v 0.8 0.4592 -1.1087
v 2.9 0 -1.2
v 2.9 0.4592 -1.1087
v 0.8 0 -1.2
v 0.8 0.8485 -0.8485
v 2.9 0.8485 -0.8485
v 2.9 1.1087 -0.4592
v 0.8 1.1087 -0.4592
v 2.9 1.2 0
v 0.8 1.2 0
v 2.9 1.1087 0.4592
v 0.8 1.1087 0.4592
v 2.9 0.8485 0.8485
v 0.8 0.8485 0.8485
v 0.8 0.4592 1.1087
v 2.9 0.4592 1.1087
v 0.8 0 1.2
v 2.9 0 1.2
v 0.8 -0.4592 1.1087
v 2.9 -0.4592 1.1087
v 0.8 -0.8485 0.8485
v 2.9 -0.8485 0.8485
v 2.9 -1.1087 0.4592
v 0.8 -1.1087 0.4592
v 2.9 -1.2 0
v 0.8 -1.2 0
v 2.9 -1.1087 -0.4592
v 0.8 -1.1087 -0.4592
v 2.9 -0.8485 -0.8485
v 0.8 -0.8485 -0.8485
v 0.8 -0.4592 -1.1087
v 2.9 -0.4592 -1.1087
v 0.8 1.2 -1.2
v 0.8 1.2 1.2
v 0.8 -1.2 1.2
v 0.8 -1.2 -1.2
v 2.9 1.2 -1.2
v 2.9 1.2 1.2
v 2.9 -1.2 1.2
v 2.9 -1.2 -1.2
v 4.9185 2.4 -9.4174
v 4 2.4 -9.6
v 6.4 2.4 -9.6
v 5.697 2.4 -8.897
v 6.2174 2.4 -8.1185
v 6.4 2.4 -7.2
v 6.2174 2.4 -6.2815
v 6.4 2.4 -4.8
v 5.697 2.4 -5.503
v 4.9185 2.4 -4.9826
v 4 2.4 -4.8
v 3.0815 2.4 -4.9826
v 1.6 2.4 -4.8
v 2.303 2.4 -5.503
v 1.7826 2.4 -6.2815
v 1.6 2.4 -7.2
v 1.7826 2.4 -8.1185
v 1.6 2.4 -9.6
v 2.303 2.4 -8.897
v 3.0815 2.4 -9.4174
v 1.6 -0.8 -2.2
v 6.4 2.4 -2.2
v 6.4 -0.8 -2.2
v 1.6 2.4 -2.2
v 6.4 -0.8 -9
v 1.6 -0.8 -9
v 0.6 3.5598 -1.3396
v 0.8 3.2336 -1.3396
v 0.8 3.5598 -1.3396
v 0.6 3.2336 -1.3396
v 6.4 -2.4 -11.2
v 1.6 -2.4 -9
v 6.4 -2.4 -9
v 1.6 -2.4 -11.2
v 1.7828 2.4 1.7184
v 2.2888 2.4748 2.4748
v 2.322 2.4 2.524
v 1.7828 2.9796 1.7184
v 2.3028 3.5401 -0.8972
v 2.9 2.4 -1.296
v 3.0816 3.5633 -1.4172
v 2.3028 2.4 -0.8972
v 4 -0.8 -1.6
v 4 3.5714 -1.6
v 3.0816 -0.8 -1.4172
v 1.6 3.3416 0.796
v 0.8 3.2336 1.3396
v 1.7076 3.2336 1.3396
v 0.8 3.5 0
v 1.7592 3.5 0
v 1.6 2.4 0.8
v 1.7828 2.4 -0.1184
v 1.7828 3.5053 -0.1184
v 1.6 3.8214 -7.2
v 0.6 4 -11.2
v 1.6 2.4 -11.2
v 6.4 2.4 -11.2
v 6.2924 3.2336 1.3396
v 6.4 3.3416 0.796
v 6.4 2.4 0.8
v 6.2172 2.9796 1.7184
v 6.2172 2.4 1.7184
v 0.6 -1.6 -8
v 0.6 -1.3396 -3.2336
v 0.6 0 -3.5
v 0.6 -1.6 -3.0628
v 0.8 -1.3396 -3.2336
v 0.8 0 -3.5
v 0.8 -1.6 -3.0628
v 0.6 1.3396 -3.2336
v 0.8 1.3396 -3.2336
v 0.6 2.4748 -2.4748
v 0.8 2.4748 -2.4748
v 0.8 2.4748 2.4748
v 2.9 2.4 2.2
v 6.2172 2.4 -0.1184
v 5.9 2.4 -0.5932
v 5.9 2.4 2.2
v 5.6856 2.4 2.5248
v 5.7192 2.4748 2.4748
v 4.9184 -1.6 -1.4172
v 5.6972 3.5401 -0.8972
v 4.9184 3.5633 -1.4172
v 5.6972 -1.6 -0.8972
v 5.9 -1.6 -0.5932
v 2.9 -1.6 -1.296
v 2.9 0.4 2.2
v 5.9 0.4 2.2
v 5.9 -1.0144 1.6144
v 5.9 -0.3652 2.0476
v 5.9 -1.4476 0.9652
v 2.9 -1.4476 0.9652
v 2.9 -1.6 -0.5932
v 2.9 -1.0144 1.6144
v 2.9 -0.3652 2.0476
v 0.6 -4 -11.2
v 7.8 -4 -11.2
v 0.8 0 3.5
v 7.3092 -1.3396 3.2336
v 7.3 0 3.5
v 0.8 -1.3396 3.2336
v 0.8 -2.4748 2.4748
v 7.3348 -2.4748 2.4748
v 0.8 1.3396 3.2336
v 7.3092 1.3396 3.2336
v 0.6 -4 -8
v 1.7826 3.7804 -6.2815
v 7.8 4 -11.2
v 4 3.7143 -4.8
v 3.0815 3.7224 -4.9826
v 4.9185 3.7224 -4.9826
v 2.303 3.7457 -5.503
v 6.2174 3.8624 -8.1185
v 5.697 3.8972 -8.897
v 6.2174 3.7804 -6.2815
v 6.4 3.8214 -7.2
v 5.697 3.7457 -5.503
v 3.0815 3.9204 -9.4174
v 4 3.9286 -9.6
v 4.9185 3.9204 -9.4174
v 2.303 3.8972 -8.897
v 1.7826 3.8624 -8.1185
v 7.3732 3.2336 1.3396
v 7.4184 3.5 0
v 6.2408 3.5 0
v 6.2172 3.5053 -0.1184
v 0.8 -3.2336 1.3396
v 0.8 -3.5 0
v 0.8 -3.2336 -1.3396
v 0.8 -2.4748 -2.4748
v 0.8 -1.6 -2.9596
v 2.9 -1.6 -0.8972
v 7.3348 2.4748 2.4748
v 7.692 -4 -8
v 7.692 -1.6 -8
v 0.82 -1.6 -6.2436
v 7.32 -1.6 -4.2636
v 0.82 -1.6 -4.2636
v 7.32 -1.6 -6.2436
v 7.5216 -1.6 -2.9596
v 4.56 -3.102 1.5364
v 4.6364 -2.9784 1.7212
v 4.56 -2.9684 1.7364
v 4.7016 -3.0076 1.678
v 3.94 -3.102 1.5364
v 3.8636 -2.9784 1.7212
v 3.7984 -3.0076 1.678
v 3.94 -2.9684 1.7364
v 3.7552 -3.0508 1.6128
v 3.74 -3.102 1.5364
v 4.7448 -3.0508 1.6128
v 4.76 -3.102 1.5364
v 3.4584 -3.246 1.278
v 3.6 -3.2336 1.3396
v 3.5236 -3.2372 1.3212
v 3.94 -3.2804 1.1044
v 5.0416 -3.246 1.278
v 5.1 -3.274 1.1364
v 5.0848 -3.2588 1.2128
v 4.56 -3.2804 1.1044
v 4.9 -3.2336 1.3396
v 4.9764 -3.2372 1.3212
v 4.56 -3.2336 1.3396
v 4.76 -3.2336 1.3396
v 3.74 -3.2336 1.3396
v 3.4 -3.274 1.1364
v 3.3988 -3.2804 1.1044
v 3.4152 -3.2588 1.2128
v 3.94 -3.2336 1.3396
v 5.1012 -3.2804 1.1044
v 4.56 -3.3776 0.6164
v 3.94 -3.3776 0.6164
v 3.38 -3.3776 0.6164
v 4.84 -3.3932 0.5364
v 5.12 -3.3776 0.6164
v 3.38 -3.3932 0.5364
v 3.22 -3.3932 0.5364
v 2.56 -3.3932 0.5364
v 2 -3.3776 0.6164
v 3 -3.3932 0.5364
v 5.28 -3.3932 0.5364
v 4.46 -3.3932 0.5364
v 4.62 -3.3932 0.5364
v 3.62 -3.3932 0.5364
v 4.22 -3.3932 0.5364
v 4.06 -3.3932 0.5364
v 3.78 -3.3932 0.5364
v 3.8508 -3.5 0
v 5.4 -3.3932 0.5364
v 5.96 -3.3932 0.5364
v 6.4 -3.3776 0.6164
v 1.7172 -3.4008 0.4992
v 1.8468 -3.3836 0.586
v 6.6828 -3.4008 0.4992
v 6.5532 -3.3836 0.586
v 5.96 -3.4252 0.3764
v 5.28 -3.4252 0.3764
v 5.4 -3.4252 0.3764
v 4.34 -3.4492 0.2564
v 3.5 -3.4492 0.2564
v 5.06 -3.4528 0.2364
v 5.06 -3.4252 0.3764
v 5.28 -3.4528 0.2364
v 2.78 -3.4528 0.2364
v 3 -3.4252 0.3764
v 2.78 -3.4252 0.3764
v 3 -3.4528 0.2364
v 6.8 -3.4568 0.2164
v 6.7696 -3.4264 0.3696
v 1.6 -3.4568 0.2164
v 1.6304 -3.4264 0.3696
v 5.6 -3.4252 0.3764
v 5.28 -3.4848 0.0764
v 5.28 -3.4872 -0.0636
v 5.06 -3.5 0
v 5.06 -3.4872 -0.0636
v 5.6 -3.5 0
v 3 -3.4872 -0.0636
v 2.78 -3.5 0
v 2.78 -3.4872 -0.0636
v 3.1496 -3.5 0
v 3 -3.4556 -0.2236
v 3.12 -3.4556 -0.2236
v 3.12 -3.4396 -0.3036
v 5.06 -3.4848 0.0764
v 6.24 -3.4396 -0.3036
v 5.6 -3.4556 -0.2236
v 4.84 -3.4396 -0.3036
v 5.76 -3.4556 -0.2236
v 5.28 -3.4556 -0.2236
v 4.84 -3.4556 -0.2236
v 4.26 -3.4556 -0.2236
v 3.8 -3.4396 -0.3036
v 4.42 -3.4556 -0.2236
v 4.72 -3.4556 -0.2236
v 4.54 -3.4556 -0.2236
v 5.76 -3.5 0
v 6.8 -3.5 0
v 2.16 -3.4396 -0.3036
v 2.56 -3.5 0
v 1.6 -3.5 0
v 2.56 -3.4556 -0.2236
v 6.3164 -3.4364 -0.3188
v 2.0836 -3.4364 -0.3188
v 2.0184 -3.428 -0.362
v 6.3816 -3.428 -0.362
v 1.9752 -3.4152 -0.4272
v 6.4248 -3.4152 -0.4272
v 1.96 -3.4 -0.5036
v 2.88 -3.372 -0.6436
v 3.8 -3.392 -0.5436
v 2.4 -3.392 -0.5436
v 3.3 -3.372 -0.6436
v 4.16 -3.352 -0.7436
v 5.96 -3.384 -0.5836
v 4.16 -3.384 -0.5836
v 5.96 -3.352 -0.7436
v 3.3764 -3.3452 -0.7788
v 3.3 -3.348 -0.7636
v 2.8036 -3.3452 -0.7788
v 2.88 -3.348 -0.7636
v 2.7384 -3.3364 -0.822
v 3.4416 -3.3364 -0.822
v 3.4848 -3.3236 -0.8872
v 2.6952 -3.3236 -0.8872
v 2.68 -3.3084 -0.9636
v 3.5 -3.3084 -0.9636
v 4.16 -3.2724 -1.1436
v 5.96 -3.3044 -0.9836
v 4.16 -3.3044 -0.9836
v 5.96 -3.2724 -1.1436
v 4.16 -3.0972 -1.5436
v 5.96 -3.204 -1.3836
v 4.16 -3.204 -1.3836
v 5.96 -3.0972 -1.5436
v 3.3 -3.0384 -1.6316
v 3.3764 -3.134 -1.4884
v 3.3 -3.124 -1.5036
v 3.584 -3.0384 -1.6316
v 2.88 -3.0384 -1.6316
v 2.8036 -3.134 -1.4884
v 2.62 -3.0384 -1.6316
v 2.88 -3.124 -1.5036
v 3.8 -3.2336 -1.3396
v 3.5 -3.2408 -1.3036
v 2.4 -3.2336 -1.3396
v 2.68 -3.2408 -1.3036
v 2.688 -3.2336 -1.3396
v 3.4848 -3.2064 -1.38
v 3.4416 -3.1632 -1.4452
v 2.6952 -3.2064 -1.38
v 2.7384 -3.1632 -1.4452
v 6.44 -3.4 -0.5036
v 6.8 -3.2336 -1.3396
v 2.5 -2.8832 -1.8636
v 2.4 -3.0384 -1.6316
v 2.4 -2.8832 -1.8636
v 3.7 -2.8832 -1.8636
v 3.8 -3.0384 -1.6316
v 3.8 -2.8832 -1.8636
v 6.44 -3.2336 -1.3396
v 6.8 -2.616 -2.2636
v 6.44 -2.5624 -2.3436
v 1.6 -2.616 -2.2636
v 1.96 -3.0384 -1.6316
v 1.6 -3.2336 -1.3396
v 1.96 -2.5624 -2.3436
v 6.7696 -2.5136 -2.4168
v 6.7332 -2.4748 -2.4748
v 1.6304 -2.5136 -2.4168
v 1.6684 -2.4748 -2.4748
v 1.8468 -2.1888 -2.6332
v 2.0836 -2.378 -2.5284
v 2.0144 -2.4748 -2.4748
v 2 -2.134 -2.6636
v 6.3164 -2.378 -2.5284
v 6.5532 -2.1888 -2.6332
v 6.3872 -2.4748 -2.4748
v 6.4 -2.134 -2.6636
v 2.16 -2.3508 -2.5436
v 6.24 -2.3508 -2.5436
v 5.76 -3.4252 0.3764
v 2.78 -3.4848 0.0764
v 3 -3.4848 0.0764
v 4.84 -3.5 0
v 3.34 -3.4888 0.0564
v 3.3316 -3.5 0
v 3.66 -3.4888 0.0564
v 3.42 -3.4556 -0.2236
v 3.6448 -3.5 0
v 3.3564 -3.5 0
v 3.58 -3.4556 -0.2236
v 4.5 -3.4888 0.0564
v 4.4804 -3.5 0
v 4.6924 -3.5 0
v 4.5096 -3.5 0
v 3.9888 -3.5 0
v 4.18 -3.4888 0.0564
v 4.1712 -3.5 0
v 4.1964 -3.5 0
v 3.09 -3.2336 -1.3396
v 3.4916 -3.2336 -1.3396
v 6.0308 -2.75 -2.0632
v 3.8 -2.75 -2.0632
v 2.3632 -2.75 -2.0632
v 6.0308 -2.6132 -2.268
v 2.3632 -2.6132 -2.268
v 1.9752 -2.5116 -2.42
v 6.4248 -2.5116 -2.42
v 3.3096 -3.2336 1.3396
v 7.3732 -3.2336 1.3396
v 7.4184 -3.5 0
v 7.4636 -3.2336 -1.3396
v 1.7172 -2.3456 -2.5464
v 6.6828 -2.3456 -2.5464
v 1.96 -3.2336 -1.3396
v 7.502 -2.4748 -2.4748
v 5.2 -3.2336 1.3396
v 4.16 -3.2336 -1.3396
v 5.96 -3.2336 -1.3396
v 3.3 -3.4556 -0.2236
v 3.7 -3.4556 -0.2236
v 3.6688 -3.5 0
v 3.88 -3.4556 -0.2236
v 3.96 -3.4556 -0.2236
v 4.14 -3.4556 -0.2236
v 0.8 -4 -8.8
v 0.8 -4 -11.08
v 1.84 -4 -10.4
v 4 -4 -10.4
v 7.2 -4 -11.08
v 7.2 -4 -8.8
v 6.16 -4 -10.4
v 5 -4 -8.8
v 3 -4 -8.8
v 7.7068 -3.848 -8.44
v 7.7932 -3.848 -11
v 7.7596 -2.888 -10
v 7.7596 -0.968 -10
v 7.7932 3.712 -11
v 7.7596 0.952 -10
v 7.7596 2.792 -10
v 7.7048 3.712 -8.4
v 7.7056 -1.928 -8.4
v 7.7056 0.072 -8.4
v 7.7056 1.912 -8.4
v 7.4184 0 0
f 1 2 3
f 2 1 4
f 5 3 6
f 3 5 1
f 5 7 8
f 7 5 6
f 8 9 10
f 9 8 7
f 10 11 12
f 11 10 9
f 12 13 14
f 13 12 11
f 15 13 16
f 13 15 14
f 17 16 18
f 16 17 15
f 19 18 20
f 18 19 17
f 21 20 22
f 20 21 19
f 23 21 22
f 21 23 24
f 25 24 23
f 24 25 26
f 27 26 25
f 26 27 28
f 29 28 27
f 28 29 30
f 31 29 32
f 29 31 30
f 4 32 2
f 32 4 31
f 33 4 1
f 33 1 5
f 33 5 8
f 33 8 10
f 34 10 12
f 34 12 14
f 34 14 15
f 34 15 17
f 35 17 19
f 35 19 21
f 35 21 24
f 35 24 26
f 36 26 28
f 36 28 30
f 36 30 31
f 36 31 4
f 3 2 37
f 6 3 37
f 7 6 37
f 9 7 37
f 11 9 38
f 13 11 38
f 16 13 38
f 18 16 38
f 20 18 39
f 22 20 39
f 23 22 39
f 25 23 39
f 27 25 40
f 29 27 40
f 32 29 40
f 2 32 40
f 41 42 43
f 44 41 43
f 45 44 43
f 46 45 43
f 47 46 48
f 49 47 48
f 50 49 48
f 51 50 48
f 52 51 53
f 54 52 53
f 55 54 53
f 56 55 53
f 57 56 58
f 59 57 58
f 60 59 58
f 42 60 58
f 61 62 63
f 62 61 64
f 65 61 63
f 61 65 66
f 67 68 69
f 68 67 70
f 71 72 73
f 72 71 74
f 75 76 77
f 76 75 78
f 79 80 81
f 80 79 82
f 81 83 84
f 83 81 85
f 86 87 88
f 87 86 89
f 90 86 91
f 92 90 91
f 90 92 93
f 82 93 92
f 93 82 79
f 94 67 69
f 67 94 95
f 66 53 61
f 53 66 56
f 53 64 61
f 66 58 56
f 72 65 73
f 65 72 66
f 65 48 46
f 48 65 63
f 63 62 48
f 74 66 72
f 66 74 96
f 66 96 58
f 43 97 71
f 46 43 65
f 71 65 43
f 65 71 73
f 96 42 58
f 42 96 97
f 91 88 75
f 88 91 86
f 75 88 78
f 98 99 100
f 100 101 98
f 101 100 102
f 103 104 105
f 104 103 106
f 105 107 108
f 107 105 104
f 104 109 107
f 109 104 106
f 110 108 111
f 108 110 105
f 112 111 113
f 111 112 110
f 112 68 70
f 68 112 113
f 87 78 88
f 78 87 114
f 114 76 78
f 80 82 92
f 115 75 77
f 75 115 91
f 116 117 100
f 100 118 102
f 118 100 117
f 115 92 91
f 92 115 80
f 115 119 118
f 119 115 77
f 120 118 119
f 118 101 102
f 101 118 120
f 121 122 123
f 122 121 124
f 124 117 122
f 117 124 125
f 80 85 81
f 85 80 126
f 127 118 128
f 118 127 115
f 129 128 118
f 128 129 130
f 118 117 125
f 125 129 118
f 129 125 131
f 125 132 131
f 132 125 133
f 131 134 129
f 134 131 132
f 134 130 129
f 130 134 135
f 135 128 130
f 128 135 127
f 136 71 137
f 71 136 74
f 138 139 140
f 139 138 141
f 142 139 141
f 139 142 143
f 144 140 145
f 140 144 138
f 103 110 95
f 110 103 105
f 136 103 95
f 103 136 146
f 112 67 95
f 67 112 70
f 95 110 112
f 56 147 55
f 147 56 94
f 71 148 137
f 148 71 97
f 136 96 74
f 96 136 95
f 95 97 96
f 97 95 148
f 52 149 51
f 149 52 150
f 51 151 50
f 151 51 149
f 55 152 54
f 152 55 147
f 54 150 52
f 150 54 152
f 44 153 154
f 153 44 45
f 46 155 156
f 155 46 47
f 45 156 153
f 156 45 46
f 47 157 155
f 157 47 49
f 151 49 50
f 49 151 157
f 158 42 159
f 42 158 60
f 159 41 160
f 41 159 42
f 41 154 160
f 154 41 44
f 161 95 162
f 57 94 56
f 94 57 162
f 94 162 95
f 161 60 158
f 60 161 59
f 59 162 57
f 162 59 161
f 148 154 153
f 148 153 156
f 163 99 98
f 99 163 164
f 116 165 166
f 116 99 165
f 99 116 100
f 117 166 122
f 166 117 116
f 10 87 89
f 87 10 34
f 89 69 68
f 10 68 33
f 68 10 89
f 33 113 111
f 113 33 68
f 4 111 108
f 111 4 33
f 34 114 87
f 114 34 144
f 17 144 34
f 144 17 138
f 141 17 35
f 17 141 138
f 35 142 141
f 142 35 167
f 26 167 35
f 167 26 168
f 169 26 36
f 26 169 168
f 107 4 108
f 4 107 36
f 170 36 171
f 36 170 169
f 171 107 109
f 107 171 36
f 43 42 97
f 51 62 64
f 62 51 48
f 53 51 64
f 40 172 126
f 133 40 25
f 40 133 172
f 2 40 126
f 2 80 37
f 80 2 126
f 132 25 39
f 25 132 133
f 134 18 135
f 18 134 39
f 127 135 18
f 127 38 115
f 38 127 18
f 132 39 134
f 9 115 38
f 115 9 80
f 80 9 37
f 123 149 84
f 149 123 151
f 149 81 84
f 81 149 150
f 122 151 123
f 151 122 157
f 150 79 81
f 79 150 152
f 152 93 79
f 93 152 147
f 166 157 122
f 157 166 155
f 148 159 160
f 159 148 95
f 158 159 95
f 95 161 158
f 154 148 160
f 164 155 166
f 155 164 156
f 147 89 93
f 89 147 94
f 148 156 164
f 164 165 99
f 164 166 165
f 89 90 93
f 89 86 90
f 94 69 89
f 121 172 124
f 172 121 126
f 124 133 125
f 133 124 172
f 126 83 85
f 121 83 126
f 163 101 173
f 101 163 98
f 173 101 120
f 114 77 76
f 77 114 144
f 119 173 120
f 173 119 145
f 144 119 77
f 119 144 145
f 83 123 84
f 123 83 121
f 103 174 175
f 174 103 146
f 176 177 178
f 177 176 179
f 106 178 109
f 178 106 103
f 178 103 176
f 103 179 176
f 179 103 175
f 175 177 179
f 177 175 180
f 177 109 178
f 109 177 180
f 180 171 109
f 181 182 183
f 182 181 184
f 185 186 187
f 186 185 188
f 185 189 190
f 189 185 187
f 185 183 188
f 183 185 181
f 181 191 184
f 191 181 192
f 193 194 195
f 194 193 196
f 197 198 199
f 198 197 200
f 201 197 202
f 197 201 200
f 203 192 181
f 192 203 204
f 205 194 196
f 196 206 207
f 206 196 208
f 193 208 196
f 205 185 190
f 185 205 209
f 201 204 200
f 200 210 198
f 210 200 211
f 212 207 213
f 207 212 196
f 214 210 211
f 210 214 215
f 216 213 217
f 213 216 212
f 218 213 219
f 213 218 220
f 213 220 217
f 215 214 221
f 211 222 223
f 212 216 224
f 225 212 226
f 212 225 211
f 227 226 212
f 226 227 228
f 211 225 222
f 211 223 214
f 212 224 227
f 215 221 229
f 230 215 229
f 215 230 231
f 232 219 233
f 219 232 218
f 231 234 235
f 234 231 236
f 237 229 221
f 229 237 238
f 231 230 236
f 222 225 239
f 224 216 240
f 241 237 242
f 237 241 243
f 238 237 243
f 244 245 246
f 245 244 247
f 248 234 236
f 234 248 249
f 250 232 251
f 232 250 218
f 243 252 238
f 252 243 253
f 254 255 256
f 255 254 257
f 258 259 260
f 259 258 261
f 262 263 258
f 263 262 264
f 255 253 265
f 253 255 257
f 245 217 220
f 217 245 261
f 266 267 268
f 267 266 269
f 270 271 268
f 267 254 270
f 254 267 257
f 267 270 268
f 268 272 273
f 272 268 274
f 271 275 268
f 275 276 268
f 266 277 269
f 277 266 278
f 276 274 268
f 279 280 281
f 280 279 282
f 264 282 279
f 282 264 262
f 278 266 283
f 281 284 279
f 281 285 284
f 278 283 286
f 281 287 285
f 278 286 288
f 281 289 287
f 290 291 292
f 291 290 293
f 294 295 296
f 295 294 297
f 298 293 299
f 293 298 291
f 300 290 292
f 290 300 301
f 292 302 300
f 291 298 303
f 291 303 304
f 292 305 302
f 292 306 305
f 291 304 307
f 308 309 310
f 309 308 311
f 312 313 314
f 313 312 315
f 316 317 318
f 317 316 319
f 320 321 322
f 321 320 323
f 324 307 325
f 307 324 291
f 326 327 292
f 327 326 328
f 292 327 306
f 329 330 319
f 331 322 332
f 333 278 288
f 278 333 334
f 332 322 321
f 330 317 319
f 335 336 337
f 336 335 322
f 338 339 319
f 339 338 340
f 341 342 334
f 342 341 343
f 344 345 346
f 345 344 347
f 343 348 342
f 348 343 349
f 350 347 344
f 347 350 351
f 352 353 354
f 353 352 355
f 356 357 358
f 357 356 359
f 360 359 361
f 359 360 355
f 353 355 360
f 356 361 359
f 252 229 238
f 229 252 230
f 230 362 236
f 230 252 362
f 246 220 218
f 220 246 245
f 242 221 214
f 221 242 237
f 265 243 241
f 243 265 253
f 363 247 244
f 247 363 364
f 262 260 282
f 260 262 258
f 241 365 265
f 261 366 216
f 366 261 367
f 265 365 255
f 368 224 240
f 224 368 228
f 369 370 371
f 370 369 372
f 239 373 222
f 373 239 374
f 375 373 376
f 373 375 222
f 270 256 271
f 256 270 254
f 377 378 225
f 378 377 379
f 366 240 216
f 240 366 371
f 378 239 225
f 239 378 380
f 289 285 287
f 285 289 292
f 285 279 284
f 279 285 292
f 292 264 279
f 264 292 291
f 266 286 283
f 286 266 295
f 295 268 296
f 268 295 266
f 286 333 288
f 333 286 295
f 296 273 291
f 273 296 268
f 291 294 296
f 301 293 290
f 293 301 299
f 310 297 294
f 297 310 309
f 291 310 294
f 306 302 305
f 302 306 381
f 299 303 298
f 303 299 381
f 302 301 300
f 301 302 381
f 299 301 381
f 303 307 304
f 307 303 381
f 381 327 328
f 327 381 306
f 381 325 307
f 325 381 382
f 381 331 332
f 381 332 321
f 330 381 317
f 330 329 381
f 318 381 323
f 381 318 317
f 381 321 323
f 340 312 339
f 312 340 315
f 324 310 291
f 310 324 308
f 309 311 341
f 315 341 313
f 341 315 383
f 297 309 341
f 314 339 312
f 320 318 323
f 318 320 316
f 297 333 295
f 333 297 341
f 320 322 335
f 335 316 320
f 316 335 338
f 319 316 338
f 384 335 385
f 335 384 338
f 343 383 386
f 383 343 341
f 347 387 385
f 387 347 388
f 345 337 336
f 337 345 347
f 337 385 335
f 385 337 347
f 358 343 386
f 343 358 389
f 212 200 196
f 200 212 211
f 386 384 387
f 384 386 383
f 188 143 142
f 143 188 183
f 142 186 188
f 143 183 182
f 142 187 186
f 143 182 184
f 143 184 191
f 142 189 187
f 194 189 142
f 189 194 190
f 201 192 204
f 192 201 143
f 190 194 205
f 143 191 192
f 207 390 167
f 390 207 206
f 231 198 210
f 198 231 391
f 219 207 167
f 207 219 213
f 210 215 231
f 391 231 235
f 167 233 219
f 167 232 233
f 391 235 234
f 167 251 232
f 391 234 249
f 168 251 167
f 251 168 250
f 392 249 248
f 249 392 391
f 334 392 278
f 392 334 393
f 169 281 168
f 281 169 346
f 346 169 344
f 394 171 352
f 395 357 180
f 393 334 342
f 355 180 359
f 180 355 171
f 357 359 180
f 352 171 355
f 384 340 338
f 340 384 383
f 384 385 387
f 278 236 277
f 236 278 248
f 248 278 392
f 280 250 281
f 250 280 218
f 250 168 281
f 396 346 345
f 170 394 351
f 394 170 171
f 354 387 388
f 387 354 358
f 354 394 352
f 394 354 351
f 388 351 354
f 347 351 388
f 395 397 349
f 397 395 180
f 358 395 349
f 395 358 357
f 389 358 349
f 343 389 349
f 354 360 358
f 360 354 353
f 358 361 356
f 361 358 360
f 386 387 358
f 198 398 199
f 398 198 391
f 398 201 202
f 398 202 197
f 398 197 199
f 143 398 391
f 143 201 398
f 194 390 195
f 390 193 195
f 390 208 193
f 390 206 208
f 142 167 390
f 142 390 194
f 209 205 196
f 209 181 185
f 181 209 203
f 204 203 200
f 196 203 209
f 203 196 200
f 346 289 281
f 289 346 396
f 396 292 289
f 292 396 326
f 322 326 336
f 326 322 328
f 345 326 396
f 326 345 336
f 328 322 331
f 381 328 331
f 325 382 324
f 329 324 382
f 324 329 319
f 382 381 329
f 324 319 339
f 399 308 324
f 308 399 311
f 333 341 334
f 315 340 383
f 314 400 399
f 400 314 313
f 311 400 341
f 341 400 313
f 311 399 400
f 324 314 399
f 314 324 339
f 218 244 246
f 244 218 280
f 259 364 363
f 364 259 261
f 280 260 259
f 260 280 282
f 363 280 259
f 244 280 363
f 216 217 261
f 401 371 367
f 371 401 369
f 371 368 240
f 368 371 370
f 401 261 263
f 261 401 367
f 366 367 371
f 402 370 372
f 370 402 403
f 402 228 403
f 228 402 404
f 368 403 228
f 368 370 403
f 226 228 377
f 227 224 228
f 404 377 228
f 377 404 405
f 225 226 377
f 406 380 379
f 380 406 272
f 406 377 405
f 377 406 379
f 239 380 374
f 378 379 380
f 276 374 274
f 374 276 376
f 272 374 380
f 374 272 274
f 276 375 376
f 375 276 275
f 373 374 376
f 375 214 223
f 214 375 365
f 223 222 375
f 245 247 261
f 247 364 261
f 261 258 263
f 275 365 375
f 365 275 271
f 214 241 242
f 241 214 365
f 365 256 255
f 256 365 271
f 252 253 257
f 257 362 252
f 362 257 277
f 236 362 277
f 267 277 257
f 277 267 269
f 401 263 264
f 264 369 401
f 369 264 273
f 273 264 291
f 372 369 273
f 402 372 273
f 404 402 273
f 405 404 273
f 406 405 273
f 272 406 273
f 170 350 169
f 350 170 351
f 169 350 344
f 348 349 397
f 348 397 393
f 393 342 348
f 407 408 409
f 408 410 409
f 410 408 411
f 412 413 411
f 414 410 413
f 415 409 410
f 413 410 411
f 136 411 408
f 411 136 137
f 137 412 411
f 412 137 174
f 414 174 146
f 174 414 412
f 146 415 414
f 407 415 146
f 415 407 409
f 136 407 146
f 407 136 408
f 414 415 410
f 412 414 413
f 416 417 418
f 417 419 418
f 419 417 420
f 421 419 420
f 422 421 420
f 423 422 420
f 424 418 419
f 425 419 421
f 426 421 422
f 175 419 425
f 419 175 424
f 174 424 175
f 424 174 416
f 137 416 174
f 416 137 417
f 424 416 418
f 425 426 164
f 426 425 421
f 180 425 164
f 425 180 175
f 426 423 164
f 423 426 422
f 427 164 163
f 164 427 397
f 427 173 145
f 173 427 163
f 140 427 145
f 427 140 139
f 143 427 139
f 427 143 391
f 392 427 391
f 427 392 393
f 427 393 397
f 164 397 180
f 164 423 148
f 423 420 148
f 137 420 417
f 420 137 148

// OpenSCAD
use <../lib.scad>
use <s/3817bp8is01.scad>
use <s/3817bp8is02.scad>
use <s/3817bs02.scad>
function ldraw_lib__3817bp8i() = [
// 0 ~Minifig Leg Left with 'EMMET' Badge, Reflective Stripe and Silver Triangles on Foot Pattern (Obsolete)
// 0 Name: 3817bp8i.dat
// 0 Author: Chris Dee [cwdee]
// 0 !LDRAW_ORG Part UPDATE 2023-03
// 0 !LICENSE Licensed under CC BY 4.0 : see CAreadme.txt
// 
// 0 BFC CERTIFY CCW
  [0,"BFC","CERTIFY"],
  [0,"BFC","CCW"],
// 
// 0 !CATEGORY Obsolete
// 0 !KEYWORDS Emmet, Set 70816
// 
// 0 !CMDLINE -c25
// 
// 0 !HISTORY 2015-10-27 [Christophe_Mitillo] Original pattern design
// 0 !HISTORY 2020-06-13 [cwdee] Adapted to corrected geometry
// 0 !HISTORY 2020-12-29 [PTadmin] Official Update 2020-03
// 0 !HISTORY 2023-05-22 [Holly-Wood] Obsoleted due to bad geometry
// 0 !HISTORY 2023-06-24 [OrionP] Official Update 2023-03
// 
// 
// 1 16 0 0 0 1 0 0 0 1 0 0 0 1 s\3817bs02.dat
  [1,16,0,0,0,1,0,0,0,1,0,0,0,1, ldraw_lib__s__3817bs02()],
// 0 // Foot Top
// 4 16 1.5 20 -4 1.5 20 -10 19.23 20 -10 19.23 20 -4
  [4,16,1.5,20,-4,1.5,20,-10,19.23,20,-10,19.23,20,-4],
// 0 // Curve and front pattern
// 1 16 0 0 0 1 0 0 0 1 0 0 0 1 s\3817bp8is01.dat
  [1,16,0,0,0,1,0,0,0,1,0,0,0,1, ldraw_lib__s__3817bp8is01()],
// 5 24 2 3.349 -8.084 18.659 3.349 -8.084 2 0 -8.75 2 6.187 -6.187
  [5,24,2,3.349,-8.084,18.659,3.349,-8.084,2,0,-8.75,2,6.187,-6.187],
// 5 24 2 6.187 -6.187 18.755 6.187 -6.187 2 7.399 -4 2 3.349 -8.084
  [5,24,2,6.187,-6.187,18.755,6.187,-6.187,2,7.399,-4,2,3.349,-8.084],
// 5 24 2 0 -8.75 18.546 0 -8.75 2 3.349 -8.084 2 -3.349 -8.084
  [5,24,2,0,-8.75,18.546,0,-8.75,2,3.349,-8.084,2,-3.349,-8.084],
// 5 24 2 -3.349 -8.084 18.433 -3.349 -8.084 2 0 -8.75 2 -6.187 -6.187
  [5,24,2,-3.349,-8.084,18.433,-3.349,-8.084,2,0,-8.75,2,-6.187,-6.187],
// 0 // Side and foot front
// 1 16 0 0 0 1 0 0 0 1 0 0 0 1 s\3817bp8is02.dat
  [1,16,0,0,0,1,0,0,0,1,0,0,0,1, ldraw_lib__s__3817bp8is02()],
];
module ldraw_lib__3817bp8i(step=0, col=false, unit=2/5, alt=false, line=0.2, solid=!$preview)
    makepoly(ldraw_lib__3817bp8i(), step=step, col=col, unit=unit, alt=alt, line=line, solid=solid);
ldraw_lib__3817bp8i(line=0.2);
